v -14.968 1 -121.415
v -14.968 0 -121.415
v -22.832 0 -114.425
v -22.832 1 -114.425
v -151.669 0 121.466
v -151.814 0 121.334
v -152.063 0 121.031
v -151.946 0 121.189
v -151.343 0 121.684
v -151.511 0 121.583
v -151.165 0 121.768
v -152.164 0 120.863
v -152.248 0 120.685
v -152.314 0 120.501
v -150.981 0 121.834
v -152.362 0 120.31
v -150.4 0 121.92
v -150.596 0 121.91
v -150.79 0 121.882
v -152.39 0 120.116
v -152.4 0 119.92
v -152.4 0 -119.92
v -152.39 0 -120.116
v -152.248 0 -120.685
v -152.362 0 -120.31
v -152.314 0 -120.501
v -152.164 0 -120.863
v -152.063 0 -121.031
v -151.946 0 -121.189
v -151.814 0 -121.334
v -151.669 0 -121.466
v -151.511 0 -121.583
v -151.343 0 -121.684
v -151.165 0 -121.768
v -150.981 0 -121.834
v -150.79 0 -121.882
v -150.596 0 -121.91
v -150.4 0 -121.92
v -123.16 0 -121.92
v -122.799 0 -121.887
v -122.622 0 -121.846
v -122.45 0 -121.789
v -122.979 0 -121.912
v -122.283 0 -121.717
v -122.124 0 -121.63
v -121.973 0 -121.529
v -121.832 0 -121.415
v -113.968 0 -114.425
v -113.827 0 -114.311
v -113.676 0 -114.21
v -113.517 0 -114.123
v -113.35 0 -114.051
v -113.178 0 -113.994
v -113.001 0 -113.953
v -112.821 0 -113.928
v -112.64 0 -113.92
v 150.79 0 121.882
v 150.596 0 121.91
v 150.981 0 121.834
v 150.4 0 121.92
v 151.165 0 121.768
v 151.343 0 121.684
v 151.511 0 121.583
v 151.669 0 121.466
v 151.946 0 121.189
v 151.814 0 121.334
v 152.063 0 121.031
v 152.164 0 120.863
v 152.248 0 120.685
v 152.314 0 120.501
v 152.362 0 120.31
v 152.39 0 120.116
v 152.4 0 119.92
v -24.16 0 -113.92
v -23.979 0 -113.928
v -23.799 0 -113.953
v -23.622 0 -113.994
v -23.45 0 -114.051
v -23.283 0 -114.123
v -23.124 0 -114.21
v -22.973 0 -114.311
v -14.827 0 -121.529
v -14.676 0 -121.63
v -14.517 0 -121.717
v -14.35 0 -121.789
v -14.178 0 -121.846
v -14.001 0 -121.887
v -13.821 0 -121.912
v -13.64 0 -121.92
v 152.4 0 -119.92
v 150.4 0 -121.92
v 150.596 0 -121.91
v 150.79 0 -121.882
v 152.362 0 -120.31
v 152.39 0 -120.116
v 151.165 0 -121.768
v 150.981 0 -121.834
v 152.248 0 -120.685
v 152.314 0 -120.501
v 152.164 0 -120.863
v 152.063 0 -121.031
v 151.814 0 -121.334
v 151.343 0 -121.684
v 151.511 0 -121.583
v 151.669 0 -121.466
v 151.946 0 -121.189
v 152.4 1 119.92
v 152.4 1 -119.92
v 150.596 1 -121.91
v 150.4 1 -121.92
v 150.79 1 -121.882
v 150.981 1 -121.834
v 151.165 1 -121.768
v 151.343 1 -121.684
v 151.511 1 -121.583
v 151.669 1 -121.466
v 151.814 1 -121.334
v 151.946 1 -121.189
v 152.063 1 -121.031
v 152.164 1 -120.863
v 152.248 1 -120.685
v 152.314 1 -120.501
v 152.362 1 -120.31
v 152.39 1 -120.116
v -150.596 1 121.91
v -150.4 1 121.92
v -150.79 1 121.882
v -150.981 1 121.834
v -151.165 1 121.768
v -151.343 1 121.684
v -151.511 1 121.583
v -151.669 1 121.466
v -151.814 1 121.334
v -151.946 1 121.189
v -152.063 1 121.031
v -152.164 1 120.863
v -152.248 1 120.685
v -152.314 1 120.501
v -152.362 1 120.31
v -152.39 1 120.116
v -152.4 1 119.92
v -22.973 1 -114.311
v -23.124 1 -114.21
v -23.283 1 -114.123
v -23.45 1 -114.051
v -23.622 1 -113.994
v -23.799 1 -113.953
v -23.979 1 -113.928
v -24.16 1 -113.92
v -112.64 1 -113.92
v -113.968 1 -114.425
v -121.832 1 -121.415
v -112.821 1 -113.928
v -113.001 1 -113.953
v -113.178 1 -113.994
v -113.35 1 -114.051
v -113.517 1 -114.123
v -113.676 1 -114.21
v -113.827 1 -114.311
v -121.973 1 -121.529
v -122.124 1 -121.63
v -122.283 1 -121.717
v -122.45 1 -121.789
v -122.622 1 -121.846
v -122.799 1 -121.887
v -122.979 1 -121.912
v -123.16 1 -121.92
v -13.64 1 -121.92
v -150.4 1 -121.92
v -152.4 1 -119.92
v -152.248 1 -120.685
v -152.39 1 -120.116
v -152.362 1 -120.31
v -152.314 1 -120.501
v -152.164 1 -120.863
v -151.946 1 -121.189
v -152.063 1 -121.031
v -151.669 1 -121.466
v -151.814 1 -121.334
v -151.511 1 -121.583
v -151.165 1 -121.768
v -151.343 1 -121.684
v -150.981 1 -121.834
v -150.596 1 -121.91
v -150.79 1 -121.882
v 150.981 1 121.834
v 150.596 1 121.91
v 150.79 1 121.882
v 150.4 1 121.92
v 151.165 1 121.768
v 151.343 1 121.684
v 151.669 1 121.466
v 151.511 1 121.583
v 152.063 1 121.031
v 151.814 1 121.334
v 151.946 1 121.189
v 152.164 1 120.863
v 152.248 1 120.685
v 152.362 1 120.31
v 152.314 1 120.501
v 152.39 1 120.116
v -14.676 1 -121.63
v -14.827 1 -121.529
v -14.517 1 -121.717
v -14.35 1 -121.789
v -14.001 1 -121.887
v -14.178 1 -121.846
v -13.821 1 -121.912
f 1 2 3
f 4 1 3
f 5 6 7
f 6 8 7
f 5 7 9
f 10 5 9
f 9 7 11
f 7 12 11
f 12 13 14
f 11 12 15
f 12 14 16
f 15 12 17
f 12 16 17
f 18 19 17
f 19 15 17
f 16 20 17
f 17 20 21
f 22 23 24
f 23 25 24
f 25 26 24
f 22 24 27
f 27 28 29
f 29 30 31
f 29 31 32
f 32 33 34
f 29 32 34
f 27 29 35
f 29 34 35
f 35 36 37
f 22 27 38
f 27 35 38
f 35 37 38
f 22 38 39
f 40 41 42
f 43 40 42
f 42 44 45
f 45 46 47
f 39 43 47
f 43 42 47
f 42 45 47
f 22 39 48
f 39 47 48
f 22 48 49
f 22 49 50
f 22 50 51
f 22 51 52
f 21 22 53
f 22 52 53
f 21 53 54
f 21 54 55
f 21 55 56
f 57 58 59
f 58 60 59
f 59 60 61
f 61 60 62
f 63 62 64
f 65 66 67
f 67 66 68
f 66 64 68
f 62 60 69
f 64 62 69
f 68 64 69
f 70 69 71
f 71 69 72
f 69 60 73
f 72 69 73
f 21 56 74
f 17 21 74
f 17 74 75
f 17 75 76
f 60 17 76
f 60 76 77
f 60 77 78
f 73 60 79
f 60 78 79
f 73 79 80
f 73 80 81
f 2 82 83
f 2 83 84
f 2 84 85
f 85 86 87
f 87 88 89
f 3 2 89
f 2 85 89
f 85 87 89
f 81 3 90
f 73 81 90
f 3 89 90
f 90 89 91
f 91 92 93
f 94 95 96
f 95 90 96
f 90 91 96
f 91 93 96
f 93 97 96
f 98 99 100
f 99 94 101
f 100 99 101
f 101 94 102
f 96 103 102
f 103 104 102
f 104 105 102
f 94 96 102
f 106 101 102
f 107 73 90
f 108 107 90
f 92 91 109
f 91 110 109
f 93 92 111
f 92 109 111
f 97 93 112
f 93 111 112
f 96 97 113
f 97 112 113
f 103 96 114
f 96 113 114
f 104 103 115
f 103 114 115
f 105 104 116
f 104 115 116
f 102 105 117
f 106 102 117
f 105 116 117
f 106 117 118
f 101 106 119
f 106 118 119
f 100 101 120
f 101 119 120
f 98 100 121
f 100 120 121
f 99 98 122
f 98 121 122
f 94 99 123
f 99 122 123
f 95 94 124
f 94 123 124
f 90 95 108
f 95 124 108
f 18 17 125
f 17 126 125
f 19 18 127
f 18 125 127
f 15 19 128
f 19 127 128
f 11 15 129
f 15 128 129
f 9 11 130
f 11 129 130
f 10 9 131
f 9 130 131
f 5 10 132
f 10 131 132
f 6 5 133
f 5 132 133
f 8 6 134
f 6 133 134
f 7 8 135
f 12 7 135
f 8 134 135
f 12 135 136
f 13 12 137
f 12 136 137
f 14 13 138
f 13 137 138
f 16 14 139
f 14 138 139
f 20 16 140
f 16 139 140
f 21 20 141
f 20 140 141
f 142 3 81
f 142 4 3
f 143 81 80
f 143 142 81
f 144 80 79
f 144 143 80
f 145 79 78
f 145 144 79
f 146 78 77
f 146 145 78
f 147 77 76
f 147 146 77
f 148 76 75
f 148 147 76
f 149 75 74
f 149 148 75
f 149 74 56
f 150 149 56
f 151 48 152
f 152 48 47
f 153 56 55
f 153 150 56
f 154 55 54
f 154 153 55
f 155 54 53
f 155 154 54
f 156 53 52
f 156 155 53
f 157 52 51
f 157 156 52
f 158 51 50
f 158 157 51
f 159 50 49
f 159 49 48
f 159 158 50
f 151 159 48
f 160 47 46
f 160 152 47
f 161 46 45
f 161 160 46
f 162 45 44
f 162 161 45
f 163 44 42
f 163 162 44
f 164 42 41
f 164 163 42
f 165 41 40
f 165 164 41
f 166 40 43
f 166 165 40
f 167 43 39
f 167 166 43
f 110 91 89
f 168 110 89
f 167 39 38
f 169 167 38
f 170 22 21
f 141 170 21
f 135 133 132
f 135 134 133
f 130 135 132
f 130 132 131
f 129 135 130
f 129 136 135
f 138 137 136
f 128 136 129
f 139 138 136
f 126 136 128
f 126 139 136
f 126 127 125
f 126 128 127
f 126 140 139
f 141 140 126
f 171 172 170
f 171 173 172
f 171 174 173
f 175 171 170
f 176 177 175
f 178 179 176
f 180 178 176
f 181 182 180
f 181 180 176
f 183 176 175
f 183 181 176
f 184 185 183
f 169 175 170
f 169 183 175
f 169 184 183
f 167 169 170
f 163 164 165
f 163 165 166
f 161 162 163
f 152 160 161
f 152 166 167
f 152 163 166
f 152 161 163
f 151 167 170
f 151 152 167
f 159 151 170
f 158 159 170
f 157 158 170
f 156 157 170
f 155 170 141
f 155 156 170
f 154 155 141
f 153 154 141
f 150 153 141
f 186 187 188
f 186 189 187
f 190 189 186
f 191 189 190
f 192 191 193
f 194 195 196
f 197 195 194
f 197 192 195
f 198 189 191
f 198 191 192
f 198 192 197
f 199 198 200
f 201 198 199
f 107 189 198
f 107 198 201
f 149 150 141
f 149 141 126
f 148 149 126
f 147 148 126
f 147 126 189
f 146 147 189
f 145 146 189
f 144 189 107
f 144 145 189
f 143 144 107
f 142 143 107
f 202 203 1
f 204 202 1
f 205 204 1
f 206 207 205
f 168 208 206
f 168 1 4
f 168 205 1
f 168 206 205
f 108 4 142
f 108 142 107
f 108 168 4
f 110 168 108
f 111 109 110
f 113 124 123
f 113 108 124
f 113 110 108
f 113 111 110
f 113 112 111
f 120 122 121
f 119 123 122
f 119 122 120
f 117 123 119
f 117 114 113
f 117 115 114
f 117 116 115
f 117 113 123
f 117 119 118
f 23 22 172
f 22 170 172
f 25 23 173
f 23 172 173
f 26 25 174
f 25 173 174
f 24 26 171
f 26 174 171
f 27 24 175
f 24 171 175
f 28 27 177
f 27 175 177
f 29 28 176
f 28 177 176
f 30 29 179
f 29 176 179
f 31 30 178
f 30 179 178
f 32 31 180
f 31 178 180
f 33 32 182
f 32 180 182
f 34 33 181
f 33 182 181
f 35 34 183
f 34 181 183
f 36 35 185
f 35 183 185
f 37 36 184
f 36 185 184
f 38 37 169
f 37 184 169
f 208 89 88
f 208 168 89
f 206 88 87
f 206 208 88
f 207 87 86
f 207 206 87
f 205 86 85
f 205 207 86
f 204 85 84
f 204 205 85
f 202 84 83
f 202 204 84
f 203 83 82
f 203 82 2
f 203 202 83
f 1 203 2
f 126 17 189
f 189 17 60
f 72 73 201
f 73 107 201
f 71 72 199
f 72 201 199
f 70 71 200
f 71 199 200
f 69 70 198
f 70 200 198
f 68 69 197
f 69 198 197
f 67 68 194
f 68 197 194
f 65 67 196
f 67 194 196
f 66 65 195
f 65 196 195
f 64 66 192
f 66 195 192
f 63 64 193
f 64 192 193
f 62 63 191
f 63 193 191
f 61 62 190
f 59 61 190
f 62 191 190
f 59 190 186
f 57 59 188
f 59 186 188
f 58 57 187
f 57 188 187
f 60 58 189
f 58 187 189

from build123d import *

# Parameters (mm, degrees)
BOSS_EXTRUDE1_DEPTH = 1
FILLET1_R           = 2
FILLET2_R           = 2


with BuildPart() as part:
    # Sketch1 → Boss-Extrude1 (new body)
    with BuildSketch(Plane(origin=(0, 0, 0), x_dir=(1, 0, 0), z_dir=(0, 1, 0))):
        Polygon((-152.4, 121.92), (-152.4, -121.92), (152.4, -121.92), (152.4, 121.92), (-14.4, 121.92), (-23.4, 113.92), (-113.4, 113.92), (-122.4, 121.92), align=None)
    extrude(amount=BOSS_EXTRUDE1_DEPTH)

    # Fillet1
    fillet1_edges = [part.edges().sort_by_distance(p)[0] for p in [
        (-122.4, 0.5, -121.92),
        (-113.4, 0.5, -113.92),
        (-23.4, 0.5, -113.92),
        (-14.4, 0.5, -121.92),
    ]]
    fillet(fillet1_edges, radius=FILLET1_R)

    # Fillet2
    fillet2_edges = [part.edges().sort_by_distance(p)[0] for p in [
        (152.4, 0.5, 121.92),
        (-152.4, 0.5, 121.92),
        (-152.4, 0.5, -121.92),
        (152.4, 0.5, -121.92),
    ]]
    fillet(fillet2_edges, radius=FILLET2_R)


solid = part.part
